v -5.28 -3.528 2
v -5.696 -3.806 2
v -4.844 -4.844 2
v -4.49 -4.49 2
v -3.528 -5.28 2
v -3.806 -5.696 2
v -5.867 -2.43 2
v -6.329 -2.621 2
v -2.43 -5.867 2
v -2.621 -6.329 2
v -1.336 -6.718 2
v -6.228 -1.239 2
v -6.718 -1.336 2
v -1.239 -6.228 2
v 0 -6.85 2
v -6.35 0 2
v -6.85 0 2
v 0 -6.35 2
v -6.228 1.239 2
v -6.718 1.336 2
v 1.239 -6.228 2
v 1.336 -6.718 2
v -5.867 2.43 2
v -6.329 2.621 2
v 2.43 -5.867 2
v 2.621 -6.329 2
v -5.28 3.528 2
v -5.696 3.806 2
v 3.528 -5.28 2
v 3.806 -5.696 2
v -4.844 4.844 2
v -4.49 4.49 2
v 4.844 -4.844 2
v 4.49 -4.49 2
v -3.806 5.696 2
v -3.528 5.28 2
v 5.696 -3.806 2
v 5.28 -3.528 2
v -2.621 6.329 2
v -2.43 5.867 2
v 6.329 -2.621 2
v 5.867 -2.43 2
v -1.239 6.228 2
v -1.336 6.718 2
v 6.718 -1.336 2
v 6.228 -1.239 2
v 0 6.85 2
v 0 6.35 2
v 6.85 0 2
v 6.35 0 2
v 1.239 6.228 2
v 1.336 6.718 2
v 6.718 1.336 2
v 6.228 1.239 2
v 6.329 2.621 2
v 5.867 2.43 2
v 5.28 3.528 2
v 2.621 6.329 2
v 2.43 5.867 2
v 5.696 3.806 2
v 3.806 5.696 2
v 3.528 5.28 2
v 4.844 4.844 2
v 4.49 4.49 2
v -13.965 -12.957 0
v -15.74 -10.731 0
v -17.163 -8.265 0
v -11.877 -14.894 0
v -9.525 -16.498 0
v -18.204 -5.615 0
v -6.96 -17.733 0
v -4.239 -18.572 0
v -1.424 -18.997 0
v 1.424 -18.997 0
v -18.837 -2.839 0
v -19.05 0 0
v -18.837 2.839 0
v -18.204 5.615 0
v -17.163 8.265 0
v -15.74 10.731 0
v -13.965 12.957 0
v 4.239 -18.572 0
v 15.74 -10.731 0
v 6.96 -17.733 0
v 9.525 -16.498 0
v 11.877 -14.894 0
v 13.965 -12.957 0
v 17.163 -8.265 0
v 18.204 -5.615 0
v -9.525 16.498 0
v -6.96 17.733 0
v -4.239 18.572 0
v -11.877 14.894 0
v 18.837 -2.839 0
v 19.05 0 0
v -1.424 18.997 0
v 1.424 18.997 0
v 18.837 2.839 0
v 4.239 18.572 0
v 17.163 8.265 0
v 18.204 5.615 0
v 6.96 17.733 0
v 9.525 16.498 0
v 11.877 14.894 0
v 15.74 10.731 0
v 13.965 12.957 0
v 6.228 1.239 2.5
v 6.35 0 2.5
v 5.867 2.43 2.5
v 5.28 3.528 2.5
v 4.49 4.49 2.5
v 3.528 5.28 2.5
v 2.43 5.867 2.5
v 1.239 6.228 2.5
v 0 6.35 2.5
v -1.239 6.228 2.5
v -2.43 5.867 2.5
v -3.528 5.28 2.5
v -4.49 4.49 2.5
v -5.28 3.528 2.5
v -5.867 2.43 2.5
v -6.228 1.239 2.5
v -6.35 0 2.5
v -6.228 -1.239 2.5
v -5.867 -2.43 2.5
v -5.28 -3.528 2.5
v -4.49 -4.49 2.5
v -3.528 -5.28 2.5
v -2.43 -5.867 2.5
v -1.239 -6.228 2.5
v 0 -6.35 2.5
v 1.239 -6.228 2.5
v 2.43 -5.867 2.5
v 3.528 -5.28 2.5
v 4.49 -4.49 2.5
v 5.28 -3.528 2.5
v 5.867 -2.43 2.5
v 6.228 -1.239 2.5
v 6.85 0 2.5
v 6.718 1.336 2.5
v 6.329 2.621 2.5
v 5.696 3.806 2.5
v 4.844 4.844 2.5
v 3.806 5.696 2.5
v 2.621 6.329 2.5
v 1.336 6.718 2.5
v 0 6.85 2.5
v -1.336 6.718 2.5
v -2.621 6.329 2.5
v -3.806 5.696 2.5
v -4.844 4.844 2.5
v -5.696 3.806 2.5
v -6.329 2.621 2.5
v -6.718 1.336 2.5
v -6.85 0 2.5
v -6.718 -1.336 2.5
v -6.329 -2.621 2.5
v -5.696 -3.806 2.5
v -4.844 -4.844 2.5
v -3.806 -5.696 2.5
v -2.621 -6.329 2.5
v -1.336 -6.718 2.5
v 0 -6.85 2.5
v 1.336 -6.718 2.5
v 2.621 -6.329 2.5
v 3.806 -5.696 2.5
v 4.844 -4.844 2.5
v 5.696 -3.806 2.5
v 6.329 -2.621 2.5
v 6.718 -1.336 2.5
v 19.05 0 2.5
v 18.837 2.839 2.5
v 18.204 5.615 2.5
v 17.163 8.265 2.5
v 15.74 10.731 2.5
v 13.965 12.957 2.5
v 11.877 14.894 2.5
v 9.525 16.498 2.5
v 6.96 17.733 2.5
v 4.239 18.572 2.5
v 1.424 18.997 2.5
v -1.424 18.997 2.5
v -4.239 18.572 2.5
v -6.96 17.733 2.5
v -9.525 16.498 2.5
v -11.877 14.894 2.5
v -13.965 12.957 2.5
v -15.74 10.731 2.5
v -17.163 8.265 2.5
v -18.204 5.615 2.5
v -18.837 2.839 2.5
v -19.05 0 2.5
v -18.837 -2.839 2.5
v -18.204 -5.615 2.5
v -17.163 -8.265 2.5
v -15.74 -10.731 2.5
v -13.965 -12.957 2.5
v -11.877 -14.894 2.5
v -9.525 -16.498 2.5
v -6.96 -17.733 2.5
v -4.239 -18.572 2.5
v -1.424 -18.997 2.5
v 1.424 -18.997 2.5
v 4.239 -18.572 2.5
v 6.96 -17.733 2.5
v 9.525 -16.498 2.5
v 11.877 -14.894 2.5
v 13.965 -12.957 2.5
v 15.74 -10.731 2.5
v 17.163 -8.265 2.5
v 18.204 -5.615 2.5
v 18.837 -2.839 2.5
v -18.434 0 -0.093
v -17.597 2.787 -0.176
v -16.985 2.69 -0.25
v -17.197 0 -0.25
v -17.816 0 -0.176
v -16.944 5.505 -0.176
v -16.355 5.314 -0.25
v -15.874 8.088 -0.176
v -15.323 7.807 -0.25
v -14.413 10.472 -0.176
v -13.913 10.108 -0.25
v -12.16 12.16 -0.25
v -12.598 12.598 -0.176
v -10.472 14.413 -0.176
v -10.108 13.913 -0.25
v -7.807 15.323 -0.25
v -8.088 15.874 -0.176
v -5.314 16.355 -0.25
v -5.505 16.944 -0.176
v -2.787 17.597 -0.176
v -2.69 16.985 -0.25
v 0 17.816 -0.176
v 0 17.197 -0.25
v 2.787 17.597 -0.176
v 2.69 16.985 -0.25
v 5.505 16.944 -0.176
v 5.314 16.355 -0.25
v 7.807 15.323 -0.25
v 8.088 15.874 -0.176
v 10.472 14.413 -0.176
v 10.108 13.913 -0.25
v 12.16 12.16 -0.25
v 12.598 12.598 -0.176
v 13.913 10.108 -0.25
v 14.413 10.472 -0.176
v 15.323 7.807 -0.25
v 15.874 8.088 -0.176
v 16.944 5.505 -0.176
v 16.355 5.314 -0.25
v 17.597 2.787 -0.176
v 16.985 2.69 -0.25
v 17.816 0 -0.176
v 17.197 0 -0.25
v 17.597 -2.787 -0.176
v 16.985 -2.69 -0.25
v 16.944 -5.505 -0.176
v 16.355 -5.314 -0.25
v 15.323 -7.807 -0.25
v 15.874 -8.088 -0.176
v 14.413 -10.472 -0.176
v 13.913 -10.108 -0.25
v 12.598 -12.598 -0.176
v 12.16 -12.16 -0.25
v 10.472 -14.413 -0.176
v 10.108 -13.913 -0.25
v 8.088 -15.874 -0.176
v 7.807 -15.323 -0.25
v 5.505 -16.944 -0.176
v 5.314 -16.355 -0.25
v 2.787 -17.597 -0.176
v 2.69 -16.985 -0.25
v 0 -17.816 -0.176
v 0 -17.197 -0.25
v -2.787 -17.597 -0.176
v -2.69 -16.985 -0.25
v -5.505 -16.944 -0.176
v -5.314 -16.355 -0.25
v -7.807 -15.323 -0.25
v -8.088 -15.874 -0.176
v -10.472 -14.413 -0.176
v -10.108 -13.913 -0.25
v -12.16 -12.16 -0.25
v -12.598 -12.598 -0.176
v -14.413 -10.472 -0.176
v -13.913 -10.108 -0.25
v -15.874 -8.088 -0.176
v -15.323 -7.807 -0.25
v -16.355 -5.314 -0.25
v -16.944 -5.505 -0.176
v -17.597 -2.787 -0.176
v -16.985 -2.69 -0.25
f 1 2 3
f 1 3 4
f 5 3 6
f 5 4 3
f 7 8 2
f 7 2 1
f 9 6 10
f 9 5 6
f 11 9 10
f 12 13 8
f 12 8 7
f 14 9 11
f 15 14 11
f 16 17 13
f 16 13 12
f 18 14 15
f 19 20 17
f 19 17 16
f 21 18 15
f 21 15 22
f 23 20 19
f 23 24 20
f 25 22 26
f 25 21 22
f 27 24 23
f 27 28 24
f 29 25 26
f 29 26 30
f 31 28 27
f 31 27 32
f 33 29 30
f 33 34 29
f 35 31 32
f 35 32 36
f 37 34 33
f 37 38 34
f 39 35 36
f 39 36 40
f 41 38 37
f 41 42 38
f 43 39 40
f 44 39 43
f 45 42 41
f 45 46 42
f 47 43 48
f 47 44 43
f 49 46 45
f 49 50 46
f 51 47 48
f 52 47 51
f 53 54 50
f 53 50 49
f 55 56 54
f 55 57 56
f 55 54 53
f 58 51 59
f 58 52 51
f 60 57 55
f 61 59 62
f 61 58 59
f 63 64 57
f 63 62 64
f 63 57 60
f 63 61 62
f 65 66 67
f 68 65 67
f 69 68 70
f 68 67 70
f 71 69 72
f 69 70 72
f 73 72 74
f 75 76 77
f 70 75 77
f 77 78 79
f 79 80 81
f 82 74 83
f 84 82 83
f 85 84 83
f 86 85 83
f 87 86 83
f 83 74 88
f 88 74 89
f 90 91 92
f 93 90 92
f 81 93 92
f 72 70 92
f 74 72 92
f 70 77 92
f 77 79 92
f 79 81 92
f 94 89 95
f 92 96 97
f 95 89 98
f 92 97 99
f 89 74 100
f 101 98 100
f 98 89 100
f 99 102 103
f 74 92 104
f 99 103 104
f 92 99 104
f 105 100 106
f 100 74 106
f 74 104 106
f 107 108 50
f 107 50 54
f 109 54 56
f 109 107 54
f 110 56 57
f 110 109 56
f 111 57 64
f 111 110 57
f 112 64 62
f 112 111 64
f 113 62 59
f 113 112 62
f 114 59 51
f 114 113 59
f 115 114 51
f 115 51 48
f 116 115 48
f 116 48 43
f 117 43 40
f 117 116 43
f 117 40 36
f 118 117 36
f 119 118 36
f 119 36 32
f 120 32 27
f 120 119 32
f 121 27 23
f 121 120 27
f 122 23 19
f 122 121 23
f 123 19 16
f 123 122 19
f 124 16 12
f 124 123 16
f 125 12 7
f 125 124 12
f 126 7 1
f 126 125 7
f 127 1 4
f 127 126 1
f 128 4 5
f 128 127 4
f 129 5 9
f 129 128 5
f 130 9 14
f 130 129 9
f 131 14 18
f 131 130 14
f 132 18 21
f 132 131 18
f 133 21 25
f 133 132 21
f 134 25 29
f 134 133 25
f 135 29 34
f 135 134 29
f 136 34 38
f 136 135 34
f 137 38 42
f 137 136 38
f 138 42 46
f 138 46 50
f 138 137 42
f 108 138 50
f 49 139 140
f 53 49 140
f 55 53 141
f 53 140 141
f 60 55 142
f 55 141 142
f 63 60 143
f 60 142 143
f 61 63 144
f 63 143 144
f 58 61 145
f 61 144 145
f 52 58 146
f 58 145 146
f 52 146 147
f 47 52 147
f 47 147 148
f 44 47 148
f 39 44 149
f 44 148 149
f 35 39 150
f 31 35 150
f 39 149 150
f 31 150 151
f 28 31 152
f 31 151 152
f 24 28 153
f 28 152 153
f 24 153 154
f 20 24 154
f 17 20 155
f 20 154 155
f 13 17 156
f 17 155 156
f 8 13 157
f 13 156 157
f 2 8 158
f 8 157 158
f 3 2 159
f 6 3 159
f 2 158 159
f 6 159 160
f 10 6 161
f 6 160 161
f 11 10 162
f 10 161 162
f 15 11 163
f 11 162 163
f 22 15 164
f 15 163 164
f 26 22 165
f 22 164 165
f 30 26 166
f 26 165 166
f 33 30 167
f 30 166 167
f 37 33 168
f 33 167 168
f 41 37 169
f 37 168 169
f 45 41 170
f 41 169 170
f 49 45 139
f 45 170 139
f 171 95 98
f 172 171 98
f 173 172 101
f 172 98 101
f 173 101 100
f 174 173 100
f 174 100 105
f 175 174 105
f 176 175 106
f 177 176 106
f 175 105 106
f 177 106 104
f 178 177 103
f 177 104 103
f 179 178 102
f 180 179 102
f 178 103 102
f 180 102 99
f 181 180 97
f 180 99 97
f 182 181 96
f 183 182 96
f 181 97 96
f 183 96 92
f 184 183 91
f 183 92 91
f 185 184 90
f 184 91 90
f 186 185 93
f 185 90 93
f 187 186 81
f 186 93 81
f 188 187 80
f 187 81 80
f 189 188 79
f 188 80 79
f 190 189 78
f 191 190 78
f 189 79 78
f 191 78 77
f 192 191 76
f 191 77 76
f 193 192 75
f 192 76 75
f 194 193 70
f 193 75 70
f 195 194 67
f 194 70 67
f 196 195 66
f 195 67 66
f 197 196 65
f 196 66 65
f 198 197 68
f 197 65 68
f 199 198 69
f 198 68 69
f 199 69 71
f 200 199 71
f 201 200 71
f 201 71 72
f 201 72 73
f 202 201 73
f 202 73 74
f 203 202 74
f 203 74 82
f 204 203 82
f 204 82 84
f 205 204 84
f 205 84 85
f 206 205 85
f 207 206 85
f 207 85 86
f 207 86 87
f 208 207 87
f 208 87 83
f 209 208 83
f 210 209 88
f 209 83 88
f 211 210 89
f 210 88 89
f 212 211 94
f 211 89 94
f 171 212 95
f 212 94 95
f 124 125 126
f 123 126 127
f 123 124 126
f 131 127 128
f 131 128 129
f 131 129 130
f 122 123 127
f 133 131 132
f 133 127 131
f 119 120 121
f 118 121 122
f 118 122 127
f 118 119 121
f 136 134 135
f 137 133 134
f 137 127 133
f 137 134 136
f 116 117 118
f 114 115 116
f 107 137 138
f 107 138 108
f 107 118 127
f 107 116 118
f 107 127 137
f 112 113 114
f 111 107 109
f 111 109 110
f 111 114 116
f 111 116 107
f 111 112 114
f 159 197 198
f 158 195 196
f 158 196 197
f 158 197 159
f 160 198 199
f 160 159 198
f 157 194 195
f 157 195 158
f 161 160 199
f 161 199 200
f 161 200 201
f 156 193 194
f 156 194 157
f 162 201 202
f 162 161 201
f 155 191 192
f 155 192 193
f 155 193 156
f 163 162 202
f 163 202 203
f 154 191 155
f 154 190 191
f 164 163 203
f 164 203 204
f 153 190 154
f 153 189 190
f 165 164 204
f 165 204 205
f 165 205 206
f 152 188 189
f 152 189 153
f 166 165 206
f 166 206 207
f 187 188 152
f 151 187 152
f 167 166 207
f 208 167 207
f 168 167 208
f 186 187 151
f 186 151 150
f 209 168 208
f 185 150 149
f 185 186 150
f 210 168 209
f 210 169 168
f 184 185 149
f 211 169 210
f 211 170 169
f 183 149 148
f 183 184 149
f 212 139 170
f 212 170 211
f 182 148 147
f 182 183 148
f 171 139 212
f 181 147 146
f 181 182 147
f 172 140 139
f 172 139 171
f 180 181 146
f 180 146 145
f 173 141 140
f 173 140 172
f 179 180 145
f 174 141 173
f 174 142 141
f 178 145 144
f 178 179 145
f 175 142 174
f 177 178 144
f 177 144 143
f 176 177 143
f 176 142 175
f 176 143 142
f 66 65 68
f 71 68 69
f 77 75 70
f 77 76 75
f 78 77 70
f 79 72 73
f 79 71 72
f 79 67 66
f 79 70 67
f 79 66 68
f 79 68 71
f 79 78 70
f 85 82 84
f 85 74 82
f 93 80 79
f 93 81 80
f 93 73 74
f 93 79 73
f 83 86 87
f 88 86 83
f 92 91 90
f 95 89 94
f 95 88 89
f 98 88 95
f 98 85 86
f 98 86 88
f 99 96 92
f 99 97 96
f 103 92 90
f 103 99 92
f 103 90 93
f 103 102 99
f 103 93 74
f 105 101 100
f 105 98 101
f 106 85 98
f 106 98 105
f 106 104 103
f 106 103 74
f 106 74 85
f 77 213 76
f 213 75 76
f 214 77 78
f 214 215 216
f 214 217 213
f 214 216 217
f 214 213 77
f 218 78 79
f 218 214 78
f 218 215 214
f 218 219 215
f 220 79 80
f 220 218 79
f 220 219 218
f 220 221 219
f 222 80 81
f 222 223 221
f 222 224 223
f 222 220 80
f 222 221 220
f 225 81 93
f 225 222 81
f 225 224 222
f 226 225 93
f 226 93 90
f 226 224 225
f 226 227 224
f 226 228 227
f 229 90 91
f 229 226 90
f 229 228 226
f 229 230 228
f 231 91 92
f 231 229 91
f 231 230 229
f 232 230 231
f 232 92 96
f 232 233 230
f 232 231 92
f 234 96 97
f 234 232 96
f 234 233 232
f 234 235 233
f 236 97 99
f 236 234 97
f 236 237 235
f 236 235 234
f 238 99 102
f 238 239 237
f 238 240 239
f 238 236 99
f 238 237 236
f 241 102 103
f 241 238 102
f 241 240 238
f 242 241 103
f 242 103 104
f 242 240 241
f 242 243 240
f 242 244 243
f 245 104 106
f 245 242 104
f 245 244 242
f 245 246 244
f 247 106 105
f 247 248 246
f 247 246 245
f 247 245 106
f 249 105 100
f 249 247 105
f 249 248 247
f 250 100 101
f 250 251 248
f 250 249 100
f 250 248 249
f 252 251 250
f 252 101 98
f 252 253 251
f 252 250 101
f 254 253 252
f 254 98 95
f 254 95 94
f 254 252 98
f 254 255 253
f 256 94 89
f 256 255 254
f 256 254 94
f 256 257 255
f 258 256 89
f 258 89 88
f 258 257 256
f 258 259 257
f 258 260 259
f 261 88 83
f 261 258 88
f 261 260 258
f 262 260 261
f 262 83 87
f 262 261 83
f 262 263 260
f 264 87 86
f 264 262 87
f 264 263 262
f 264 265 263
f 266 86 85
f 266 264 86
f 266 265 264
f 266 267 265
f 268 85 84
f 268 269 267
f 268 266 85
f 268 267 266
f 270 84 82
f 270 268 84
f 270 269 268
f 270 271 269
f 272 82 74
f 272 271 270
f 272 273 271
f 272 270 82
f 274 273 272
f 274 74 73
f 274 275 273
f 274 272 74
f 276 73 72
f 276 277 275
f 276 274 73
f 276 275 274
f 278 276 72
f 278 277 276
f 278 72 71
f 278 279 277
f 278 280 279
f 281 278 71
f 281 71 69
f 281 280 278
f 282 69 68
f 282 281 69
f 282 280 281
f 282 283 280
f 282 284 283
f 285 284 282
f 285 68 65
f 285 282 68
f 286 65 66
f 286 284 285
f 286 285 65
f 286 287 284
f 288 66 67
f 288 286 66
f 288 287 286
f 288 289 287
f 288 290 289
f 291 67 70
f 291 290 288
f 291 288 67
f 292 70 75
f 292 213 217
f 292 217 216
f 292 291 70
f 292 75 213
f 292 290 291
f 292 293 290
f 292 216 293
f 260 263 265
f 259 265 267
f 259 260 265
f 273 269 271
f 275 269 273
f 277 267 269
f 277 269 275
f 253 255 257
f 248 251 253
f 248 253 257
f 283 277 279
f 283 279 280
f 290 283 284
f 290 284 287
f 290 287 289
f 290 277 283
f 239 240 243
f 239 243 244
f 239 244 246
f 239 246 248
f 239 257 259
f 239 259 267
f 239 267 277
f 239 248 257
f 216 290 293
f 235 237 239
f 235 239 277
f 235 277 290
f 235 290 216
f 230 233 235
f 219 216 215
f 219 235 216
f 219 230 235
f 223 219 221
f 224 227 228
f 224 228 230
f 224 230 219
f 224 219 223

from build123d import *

# Parameters (mm, degrees)
F0_R     = 19.05
F1_DEPTH = 2.5
F2_R     = 6.85
F2_R_2   = 6.35
F3_DEPTH = 0.5


with BuildPart() as f1:
    # F0 (on Top) → F1 (new body)
    with BuildSketch(Plane.XY):
        Circle(F0_R)
    extrude(amount=F1_DEPTH)

    # F2 (on face) → F3 (cut)
    with BuildSketch(Plane.XY.offset(2.5)):
        Circle(F2_R)
        Circle(F2_R_2, mode=Mode.SUBTRACT)
    extrude(amount=-F3_DEPTH, mode=Mode.SUBTRACT)


with BuildPart() as f5:
    # F4 (on Front) → F5 (revolve)
    with BuildSketch(Plane.XZ):
        with BuildLine():
            Line((0, 0), (-19.05, 0))
            ThreePointArc((-19.05, 0), (-18.124981, -0.135675), (-17.197082, -0.25))
            Line((-17.197082, -0.25), (0, -0.25))
            Line((0, -0.25), (0, 0))
        make_face()
    revolve(axis=Axis((0, 0, -0.125), (0, 0, -1)))


solid = Compound([f1.part, f5.part])
